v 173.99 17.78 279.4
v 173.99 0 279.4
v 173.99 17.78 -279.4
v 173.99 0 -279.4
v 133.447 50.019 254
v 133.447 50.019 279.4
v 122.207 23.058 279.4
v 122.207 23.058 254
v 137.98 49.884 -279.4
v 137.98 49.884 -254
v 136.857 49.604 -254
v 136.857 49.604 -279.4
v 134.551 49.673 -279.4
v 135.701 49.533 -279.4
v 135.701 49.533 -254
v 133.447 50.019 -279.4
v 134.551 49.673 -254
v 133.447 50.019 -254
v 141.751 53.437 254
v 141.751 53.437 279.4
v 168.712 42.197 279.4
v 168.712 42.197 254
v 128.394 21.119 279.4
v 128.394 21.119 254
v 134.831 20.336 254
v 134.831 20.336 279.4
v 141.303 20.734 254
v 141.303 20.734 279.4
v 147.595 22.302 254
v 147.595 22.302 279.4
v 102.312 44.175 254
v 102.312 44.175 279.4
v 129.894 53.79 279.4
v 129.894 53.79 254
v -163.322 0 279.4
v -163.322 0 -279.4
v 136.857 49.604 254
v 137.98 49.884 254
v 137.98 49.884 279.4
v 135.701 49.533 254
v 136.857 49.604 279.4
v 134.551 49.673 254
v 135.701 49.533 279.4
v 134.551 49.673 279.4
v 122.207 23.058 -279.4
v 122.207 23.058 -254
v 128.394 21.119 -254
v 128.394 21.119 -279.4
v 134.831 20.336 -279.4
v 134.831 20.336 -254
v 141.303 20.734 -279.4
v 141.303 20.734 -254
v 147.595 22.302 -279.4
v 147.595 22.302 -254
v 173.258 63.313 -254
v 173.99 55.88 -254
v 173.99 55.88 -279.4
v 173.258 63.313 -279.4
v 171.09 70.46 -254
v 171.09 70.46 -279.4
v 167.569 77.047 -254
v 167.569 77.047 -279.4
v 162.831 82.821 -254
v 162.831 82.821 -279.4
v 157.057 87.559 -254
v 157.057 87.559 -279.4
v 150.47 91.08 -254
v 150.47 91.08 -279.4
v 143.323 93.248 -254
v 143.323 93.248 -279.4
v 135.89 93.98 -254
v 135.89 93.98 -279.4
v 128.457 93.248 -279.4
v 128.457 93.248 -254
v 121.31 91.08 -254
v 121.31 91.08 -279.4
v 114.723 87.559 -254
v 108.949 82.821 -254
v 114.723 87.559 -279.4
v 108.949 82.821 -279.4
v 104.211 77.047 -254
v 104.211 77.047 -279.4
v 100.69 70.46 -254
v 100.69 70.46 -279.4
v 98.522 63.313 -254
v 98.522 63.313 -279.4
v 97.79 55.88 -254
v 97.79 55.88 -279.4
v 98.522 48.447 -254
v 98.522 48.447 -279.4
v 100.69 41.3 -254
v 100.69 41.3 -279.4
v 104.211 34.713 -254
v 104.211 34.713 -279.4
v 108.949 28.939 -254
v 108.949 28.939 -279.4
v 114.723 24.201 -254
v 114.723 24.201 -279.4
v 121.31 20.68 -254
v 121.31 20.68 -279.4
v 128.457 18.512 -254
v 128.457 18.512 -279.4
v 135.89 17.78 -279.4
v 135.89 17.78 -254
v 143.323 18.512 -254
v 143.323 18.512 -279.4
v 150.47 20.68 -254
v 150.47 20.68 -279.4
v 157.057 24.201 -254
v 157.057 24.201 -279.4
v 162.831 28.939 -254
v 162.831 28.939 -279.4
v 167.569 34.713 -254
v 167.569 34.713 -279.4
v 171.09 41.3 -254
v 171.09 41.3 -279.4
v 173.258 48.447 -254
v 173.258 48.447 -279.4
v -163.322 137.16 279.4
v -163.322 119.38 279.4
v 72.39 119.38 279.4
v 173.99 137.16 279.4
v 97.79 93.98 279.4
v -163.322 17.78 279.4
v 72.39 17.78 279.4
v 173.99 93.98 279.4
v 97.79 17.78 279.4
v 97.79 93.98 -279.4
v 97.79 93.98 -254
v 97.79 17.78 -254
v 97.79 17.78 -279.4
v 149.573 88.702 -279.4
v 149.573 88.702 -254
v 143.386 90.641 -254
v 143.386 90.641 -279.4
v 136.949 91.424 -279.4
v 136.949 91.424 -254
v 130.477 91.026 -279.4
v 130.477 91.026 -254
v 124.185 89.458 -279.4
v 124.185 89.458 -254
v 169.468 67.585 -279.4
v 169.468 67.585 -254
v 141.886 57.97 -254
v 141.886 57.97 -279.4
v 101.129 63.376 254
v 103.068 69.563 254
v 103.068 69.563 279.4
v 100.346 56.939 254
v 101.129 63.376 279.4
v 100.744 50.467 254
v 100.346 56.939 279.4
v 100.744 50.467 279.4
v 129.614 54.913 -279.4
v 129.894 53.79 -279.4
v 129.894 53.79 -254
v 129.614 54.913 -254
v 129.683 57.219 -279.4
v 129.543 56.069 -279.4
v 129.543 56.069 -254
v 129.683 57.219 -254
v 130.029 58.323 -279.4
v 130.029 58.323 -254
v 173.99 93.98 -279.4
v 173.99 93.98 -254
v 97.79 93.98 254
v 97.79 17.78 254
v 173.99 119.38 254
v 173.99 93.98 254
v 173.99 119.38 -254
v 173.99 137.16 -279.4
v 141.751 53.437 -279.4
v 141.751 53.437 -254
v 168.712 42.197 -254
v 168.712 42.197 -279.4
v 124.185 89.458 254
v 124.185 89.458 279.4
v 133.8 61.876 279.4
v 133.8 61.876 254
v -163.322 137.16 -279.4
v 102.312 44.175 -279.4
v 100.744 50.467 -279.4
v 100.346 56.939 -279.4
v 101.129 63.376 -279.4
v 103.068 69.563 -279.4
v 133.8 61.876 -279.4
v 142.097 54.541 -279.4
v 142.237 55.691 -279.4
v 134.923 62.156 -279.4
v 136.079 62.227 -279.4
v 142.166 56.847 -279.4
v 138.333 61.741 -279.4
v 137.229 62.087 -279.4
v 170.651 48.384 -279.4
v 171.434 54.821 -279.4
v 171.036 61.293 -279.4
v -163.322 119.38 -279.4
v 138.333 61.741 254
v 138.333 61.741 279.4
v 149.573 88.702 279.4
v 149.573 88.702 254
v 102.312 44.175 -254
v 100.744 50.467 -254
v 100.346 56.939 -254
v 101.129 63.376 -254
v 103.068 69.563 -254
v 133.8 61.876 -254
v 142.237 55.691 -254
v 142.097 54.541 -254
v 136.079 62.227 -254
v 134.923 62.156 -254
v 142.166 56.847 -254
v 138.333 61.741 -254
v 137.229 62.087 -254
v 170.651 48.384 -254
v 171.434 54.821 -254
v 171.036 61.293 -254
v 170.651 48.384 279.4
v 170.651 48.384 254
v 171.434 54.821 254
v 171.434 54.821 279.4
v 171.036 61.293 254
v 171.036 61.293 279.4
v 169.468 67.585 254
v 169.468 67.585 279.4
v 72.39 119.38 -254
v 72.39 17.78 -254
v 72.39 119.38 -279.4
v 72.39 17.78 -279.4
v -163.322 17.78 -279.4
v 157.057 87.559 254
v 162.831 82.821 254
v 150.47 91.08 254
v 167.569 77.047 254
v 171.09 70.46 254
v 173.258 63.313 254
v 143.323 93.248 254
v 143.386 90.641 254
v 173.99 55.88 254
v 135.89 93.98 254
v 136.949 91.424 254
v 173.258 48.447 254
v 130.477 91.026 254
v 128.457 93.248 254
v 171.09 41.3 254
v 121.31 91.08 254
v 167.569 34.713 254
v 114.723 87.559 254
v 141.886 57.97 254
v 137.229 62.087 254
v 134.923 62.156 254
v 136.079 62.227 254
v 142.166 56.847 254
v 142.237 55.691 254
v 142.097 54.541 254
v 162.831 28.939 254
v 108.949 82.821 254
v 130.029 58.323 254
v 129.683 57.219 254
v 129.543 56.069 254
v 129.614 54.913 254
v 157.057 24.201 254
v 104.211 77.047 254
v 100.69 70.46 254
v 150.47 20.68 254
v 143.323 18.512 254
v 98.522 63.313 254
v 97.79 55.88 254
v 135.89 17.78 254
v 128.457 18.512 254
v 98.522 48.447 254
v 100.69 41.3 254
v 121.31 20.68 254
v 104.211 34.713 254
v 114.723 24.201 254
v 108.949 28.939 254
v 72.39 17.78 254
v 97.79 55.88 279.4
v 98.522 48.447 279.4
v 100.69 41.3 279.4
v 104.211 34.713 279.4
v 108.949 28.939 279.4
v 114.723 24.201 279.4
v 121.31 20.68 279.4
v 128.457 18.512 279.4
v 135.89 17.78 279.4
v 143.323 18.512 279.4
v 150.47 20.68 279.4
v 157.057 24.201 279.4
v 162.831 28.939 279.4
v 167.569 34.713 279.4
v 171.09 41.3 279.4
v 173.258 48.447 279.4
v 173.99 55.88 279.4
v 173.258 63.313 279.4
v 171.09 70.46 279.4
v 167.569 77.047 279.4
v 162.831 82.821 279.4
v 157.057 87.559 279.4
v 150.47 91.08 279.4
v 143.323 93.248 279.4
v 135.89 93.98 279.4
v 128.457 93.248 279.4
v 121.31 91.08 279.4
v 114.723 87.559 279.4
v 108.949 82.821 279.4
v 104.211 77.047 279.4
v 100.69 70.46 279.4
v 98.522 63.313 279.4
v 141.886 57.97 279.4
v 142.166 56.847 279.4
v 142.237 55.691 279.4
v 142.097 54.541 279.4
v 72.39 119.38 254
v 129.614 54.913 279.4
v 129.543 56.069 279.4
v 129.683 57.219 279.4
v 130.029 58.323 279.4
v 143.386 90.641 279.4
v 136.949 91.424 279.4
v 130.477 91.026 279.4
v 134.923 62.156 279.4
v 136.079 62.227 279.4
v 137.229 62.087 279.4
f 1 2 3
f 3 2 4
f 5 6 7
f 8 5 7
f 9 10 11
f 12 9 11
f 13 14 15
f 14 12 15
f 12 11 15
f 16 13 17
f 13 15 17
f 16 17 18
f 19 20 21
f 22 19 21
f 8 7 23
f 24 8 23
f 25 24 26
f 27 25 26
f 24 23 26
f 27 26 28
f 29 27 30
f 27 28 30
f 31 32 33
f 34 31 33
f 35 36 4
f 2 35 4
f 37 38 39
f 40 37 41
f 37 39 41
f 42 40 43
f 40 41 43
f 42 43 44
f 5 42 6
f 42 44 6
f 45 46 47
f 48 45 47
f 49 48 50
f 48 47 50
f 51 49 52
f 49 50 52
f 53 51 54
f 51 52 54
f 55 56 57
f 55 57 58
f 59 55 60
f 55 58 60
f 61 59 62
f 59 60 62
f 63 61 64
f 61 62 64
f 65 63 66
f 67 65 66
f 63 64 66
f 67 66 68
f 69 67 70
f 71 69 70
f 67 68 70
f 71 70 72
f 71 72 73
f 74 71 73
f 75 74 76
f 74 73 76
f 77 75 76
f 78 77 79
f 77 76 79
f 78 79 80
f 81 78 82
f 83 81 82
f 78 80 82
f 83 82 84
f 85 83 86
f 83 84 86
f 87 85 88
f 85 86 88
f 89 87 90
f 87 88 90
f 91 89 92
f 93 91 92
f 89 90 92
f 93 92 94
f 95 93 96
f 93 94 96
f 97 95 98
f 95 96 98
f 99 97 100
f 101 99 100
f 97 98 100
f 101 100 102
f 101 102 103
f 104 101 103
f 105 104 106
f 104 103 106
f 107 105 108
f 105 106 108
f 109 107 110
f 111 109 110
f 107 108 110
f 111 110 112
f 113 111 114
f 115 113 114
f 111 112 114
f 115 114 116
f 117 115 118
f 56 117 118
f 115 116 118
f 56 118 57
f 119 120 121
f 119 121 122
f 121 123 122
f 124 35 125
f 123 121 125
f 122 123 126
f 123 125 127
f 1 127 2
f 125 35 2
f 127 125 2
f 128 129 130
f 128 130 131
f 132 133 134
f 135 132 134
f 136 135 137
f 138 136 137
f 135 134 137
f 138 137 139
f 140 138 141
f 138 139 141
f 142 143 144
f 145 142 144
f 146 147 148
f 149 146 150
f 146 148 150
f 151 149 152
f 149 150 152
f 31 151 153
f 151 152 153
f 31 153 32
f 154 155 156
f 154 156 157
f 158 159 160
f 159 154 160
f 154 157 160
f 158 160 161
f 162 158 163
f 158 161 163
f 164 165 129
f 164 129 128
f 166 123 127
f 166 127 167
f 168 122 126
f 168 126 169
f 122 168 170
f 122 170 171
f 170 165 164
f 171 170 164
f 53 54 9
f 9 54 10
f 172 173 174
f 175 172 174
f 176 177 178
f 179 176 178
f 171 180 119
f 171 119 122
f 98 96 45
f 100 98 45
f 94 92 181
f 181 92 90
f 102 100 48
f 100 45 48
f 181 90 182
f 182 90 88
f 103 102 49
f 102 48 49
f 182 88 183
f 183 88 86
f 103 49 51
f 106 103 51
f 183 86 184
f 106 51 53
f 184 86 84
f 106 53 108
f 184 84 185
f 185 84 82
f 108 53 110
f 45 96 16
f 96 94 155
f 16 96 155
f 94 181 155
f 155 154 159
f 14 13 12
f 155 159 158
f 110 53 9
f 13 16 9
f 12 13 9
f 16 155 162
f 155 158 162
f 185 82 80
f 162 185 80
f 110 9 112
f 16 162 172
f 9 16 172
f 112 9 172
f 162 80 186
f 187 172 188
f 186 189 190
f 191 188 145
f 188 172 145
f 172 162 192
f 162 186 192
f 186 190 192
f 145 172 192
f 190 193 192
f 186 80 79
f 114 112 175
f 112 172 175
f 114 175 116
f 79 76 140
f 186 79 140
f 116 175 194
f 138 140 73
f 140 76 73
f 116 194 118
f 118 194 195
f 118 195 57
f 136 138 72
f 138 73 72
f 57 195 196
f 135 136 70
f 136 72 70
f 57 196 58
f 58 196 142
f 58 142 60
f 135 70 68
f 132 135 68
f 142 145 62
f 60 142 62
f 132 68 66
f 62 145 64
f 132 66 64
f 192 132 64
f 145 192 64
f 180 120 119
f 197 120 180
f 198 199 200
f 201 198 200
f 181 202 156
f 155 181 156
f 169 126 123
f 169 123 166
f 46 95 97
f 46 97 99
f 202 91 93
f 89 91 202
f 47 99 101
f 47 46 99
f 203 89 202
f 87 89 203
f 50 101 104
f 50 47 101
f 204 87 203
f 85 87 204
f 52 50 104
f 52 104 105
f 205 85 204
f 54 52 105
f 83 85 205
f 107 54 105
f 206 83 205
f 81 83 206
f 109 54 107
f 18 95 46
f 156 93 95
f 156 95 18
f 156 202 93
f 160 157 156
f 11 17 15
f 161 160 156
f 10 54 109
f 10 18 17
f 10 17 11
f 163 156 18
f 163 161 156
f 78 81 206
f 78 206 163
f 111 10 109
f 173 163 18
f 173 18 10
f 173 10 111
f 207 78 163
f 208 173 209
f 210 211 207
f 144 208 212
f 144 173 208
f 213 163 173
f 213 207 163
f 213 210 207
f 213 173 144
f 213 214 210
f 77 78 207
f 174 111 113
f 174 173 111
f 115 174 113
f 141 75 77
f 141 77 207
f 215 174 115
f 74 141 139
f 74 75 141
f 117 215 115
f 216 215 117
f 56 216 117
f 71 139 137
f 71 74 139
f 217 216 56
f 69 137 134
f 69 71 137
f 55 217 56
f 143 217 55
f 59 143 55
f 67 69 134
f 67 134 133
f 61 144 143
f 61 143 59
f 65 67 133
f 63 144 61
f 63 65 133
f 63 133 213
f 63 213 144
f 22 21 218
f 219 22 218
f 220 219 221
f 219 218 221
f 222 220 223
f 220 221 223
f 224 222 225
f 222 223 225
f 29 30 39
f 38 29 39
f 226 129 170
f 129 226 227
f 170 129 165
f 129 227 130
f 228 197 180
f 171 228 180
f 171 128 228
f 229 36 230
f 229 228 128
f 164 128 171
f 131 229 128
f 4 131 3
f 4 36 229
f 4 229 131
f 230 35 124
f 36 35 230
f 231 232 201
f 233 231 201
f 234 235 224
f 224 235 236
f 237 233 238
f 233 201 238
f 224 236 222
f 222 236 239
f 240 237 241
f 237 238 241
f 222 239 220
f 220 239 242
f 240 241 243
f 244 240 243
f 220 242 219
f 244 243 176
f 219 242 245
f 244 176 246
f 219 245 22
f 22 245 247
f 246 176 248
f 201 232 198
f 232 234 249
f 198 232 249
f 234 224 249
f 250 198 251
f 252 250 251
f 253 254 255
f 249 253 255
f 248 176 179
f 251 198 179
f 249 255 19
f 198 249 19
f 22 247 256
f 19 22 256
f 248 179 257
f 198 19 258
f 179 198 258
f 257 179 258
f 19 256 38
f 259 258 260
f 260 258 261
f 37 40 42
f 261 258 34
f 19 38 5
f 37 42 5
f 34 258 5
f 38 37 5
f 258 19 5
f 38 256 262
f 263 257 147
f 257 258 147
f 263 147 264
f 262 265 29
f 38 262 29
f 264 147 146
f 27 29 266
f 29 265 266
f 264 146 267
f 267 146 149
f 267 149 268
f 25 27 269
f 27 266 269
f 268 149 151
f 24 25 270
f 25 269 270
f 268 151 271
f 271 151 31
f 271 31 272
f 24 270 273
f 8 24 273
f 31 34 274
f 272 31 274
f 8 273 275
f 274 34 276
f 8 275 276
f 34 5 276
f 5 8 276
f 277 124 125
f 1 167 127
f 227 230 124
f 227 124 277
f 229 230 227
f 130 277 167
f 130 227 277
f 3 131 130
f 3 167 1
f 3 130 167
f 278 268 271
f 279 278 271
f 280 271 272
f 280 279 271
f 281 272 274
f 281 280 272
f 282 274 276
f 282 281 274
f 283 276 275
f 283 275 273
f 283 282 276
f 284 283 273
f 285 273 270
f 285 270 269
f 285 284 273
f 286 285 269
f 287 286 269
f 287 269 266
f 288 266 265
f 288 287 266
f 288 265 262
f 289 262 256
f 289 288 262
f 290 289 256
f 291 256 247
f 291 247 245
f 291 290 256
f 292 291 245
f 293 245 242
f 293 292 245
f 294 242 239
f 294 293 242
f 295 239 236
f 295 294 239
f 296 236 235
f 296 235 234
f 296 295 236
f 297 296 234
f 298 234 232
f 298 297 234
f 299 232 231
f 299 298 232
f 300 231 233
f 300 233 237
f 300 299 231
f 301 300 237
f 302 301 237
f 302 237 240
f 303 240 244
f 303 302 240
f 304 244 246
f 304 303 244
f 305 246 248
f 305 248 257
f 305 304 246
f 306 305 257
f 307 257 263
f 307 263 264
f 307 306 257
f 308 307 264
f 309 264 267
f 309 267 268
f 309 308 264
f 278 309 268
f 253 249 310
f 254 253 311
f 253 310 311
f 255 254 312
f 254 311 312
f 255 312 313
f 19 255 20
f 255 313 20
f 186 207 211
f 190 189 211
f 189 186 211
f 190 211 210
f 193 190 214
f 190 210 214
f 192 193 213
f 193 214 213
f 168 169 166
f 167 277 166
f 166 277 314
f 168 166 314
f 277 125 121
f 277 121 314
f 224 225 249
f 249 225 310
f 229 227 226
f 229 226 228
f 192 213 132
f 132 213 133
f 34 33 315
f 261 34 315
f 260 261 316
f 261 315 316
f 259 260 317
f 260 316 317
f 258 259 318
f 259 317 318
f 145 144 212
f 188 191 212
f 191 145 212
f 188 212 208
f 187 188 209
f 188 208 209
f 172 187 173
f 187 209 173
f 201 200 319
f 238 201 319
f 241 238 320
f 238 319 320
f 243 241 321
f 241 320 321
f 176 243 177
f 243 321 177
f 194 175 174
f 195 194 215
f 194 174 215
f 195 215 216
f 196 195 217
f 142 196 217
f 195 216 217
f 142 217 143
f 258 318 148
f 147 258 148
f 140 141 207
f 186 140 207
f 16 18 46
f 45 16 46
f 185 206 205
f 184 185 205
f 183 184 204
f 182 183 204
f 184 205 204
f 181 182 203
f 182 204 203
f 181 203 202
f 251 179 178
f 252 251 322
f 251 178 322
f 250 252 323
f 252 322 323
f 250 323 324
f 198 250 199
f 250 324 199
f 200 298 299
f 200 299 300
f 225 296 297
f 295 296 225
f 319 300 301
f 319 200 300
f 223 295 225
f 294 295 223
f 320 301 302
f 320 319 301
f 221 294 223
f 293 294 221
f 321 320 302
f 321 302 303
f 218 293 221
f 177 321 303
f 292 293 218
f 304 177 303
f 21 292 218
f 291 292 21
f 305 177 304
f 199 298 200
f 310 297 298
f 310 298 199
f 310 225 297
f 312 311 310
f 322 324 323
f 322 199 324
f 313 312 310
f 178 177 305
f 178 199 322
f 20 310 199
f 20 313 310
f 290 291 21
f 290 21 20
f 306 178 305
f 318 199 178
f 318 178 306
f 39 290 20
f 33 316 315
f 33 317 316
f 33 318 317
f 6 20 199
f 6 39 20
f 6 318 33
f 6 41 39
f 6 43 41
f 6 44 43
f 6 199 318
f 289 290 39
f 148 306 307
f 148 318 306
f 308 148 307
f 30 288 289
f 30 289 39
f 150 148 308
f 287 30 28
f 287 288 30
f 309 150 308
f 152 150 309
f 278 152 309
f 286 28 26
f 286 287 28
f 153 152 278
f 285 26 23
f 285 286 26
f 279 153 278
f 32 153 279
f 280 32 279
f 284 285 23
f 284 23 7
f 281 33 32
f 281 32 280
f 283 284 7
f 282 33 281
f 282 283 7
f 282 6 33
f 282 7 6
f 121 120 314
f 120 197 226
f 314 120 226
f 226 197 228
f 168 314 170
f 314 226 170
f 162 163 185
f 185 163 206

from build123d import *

# Parameters (mm, degrees)
SKETCH2_W           = 347.98
SKETCH2_H           = 558.8
BOSS_EXTRUDE1_DEPTH = 17.78
SKETCH3_W           = 25.4
SKETCH3_H           = 25.4
BOSS_EXTRUDE2_DEPTH = 101.6
SKETCH4_W           = 25.4
SKETCH4_H           = 25.4
BOSS_EXTRUDE3_DEPTH = 76.2
BOSS_EXTRUDE4_START = 279.4
SKETCH5_R           = 38.1
BOSS_EXTRUDE4_DEPTH = 25.4
BOSS_EXTRUDE5_START = -279.4
SKETCH5_2_R         = 38.1
BOSS_EXTRUDE5_DEPTH = 25.4
CUT_EXTRUDE2_DEPTH  = 1270
BOSS_EXTRUDE6_START = 119.38
SKETCH2_2_W         = 347.98
SKETCH2_2_H         = 558.8
BOSS_EXTRUDE6_DEPTH = 17.78
SKETCH7_W           = 10.668
SKETCH7_H           = 558.8
CUT_EXTRUDE3_DEPTH  = 381


with BuildPart() as part:
    # Sketch2 → Boss-Extrude1 (new body)
    with BuildSketch(Plane(origin=(0, 0, 0), x_dir=(1, 0, 0), z_dir=(0, 1, 0))):
        Rectangle(SKETCH2_W, SKETCH2_H)
    extrude(amount=BOSS_EXTRUDE1_DEPTH)

    # Sketch3 → Boss-Extrude2 (add)
    with BuildSketch(Plane(origin=(0, 17.78, 0), x_dir=(1, 0, 0), z_dir=(0, 1, 0))):
        with Locations((85.09, -266.7)):
            Rectangle(SKETCH3_W, SKETCH3_H)
        with Locations((85.09, 266.7)):
            Rectangle(SKETCH3_W, SKETCH3_H)
    extrude(amount=BOSS_EXTRUDE2_DEPTH)

    # Sketch4 → Boss-Extrude3 (add)
    with BuildSketch(Plane(origin=(97.79, 0, 0), x_dir=(0, 0, -1), z_dir=(1, 0, 0))):
        with Locations((-266.7, 106.68)):
            Rectangle(SKETCH4_W, SKETCH4_H)
        with Locations((266.7, 106.68)):
            Rectangle(SKETCH4_W, SKETCH4_H)
    extrude(amount=BOSS_EXTRUDE3_DEPTH)

    # Sketch2<2> → Boss-Extrude6 (add)
    with BuildSketch(Plane(origin=(0, 0, 0), x_dir=(1, 0, 0), z_dir=(0, 1, 0)).offset(BOSS_EXTRUDE6_START)):
        Rectangle(SKETCH2_2_W, SKETCH2_2_H)
    extrude(amount=BOSS_EXTRUDE6_DEPTH)

    # Sketch7 → Cut-Extrude3 (cut)
    with BuildSketch(Plane(origin=(0, 0, 0), x_dir=(1, 0, 0), z_dir=(0, 1, 0))):
        with Locations((-168.656, 0)):
            Rectangle(SKETCH7_W, SKETCH7_H)
    extrude(amount=CUT_EXTRUDE3_DEPTH, mode=Mode.SUBTRACT)


with BuildPart() as body_2:
    # Sketch5 → Boss-Extrude4 (new body)
    with BuildSketch(Plane.XY.offset(BOSS_EXTRUDE4_START)):
        with Locations(Location((135.89, 55.88, 0), (0, 0, 180))):
            Circle(SKETCH5_R)
    extrude(amount=-BOSS_EXTRUDE4_DEPTH)


with BuildPart() as body_3:
    # Sketch5<2> → Boss-Extrude5 (new body)
    with BuildSketch(Plane.XY.offset(BOSS_EXTRUDE5_START)):
        with Locations((135.89, 55.88)):
            Circle(SKETCH5_2_R)
    extrude(amount=BOSS_EXTRUDE5_DEPTH)


with BuildPart() as cut_extrude2_tool:
    # Sketch6 → Cut-Extrude2 (new body)
    with BuildSketch(Plane.XY.offset(279.4)):
        with BuildLine():
            Line((124.184641238, 89.458239624), (133.799757364, 61.876114219))
            ThreePointArc((133.799757364, 61.876114219), (136.079078703, 62.227184356), (138.333460475, 61.741058002))
            Line((138.333460475, 61.741058002), (149.57337866, 88.701924813))
            ThreePointArc((149.57337866, 88.701924813), (136.948840735, 91.424232391), (124.184641238, 89.458239624))
        make_face()
        with BuildLine():
            Line((169.468239624, 67.585358762), (141.886114219, 57.970242636))
            ThreePointArc((141.886114219, 57.970242636), (142.237184356, 55.690921297), (141.751058002, 53.436539525))
            Line((141.751058002, 53.436539525), (168.711924813, 42.19662134))
            ThreePointArc((168.711924813, 42.19662134), (171.434232391, 54.821159265), (169.468239624, 67.585358762))
        make_face()
        with BuildLine():
            Line((147.595358762, 22.301760376), (137.980242636, 49.883885781))
            ThreePointArc((137.980242636, 49.883885781), (135.700921297, 49.532815644), (133.446539525, 50.018941998))
            Line((133.446539525, 50.018941998), (122.20662134, 23.058075187))
            ThreePointArc((122.20662134, 23.058075187), (134.831159265, 20.335767609), (147.595358762, 22.301760376))
        make_face()
        with BuildLine():
            Line((102.311760376, 44.174641238), (129.893885781, 53.789757364))
            ThreePointArc((129.893885781, 53.789757364), (129.542815644, 56.069078703), (130.028941998, 58.323460475))
            Line((130.028941998, 58.323460475), (103.068075187, 69.56337866))
            ThreePointArc((103.068075187, 69.56337866), (100.345767609, 56.938840735), (102.311760376, 44.174641238))
        make_face()
    extrude(amount=-CUT_EXTRUDE2_DEPTH)


with BuildPart() as body_2_1:
    add(body_2.part)

    # Cut-Extrude2: cut by cut_extrude2_tool
    add(cut_extrude2_tool.part, mode=Mode.SUBTRACT)


with BuildPart() as body_3_1:
    add(body_3.part)

    # Cut-Extrude2: cut by cut_extrude2_tool
    add(cut_extrude2_tool.part, mode=Mode.SUBTRACT)


solid = Compound([part.part, body_2_1.part, body_3_1.part])
